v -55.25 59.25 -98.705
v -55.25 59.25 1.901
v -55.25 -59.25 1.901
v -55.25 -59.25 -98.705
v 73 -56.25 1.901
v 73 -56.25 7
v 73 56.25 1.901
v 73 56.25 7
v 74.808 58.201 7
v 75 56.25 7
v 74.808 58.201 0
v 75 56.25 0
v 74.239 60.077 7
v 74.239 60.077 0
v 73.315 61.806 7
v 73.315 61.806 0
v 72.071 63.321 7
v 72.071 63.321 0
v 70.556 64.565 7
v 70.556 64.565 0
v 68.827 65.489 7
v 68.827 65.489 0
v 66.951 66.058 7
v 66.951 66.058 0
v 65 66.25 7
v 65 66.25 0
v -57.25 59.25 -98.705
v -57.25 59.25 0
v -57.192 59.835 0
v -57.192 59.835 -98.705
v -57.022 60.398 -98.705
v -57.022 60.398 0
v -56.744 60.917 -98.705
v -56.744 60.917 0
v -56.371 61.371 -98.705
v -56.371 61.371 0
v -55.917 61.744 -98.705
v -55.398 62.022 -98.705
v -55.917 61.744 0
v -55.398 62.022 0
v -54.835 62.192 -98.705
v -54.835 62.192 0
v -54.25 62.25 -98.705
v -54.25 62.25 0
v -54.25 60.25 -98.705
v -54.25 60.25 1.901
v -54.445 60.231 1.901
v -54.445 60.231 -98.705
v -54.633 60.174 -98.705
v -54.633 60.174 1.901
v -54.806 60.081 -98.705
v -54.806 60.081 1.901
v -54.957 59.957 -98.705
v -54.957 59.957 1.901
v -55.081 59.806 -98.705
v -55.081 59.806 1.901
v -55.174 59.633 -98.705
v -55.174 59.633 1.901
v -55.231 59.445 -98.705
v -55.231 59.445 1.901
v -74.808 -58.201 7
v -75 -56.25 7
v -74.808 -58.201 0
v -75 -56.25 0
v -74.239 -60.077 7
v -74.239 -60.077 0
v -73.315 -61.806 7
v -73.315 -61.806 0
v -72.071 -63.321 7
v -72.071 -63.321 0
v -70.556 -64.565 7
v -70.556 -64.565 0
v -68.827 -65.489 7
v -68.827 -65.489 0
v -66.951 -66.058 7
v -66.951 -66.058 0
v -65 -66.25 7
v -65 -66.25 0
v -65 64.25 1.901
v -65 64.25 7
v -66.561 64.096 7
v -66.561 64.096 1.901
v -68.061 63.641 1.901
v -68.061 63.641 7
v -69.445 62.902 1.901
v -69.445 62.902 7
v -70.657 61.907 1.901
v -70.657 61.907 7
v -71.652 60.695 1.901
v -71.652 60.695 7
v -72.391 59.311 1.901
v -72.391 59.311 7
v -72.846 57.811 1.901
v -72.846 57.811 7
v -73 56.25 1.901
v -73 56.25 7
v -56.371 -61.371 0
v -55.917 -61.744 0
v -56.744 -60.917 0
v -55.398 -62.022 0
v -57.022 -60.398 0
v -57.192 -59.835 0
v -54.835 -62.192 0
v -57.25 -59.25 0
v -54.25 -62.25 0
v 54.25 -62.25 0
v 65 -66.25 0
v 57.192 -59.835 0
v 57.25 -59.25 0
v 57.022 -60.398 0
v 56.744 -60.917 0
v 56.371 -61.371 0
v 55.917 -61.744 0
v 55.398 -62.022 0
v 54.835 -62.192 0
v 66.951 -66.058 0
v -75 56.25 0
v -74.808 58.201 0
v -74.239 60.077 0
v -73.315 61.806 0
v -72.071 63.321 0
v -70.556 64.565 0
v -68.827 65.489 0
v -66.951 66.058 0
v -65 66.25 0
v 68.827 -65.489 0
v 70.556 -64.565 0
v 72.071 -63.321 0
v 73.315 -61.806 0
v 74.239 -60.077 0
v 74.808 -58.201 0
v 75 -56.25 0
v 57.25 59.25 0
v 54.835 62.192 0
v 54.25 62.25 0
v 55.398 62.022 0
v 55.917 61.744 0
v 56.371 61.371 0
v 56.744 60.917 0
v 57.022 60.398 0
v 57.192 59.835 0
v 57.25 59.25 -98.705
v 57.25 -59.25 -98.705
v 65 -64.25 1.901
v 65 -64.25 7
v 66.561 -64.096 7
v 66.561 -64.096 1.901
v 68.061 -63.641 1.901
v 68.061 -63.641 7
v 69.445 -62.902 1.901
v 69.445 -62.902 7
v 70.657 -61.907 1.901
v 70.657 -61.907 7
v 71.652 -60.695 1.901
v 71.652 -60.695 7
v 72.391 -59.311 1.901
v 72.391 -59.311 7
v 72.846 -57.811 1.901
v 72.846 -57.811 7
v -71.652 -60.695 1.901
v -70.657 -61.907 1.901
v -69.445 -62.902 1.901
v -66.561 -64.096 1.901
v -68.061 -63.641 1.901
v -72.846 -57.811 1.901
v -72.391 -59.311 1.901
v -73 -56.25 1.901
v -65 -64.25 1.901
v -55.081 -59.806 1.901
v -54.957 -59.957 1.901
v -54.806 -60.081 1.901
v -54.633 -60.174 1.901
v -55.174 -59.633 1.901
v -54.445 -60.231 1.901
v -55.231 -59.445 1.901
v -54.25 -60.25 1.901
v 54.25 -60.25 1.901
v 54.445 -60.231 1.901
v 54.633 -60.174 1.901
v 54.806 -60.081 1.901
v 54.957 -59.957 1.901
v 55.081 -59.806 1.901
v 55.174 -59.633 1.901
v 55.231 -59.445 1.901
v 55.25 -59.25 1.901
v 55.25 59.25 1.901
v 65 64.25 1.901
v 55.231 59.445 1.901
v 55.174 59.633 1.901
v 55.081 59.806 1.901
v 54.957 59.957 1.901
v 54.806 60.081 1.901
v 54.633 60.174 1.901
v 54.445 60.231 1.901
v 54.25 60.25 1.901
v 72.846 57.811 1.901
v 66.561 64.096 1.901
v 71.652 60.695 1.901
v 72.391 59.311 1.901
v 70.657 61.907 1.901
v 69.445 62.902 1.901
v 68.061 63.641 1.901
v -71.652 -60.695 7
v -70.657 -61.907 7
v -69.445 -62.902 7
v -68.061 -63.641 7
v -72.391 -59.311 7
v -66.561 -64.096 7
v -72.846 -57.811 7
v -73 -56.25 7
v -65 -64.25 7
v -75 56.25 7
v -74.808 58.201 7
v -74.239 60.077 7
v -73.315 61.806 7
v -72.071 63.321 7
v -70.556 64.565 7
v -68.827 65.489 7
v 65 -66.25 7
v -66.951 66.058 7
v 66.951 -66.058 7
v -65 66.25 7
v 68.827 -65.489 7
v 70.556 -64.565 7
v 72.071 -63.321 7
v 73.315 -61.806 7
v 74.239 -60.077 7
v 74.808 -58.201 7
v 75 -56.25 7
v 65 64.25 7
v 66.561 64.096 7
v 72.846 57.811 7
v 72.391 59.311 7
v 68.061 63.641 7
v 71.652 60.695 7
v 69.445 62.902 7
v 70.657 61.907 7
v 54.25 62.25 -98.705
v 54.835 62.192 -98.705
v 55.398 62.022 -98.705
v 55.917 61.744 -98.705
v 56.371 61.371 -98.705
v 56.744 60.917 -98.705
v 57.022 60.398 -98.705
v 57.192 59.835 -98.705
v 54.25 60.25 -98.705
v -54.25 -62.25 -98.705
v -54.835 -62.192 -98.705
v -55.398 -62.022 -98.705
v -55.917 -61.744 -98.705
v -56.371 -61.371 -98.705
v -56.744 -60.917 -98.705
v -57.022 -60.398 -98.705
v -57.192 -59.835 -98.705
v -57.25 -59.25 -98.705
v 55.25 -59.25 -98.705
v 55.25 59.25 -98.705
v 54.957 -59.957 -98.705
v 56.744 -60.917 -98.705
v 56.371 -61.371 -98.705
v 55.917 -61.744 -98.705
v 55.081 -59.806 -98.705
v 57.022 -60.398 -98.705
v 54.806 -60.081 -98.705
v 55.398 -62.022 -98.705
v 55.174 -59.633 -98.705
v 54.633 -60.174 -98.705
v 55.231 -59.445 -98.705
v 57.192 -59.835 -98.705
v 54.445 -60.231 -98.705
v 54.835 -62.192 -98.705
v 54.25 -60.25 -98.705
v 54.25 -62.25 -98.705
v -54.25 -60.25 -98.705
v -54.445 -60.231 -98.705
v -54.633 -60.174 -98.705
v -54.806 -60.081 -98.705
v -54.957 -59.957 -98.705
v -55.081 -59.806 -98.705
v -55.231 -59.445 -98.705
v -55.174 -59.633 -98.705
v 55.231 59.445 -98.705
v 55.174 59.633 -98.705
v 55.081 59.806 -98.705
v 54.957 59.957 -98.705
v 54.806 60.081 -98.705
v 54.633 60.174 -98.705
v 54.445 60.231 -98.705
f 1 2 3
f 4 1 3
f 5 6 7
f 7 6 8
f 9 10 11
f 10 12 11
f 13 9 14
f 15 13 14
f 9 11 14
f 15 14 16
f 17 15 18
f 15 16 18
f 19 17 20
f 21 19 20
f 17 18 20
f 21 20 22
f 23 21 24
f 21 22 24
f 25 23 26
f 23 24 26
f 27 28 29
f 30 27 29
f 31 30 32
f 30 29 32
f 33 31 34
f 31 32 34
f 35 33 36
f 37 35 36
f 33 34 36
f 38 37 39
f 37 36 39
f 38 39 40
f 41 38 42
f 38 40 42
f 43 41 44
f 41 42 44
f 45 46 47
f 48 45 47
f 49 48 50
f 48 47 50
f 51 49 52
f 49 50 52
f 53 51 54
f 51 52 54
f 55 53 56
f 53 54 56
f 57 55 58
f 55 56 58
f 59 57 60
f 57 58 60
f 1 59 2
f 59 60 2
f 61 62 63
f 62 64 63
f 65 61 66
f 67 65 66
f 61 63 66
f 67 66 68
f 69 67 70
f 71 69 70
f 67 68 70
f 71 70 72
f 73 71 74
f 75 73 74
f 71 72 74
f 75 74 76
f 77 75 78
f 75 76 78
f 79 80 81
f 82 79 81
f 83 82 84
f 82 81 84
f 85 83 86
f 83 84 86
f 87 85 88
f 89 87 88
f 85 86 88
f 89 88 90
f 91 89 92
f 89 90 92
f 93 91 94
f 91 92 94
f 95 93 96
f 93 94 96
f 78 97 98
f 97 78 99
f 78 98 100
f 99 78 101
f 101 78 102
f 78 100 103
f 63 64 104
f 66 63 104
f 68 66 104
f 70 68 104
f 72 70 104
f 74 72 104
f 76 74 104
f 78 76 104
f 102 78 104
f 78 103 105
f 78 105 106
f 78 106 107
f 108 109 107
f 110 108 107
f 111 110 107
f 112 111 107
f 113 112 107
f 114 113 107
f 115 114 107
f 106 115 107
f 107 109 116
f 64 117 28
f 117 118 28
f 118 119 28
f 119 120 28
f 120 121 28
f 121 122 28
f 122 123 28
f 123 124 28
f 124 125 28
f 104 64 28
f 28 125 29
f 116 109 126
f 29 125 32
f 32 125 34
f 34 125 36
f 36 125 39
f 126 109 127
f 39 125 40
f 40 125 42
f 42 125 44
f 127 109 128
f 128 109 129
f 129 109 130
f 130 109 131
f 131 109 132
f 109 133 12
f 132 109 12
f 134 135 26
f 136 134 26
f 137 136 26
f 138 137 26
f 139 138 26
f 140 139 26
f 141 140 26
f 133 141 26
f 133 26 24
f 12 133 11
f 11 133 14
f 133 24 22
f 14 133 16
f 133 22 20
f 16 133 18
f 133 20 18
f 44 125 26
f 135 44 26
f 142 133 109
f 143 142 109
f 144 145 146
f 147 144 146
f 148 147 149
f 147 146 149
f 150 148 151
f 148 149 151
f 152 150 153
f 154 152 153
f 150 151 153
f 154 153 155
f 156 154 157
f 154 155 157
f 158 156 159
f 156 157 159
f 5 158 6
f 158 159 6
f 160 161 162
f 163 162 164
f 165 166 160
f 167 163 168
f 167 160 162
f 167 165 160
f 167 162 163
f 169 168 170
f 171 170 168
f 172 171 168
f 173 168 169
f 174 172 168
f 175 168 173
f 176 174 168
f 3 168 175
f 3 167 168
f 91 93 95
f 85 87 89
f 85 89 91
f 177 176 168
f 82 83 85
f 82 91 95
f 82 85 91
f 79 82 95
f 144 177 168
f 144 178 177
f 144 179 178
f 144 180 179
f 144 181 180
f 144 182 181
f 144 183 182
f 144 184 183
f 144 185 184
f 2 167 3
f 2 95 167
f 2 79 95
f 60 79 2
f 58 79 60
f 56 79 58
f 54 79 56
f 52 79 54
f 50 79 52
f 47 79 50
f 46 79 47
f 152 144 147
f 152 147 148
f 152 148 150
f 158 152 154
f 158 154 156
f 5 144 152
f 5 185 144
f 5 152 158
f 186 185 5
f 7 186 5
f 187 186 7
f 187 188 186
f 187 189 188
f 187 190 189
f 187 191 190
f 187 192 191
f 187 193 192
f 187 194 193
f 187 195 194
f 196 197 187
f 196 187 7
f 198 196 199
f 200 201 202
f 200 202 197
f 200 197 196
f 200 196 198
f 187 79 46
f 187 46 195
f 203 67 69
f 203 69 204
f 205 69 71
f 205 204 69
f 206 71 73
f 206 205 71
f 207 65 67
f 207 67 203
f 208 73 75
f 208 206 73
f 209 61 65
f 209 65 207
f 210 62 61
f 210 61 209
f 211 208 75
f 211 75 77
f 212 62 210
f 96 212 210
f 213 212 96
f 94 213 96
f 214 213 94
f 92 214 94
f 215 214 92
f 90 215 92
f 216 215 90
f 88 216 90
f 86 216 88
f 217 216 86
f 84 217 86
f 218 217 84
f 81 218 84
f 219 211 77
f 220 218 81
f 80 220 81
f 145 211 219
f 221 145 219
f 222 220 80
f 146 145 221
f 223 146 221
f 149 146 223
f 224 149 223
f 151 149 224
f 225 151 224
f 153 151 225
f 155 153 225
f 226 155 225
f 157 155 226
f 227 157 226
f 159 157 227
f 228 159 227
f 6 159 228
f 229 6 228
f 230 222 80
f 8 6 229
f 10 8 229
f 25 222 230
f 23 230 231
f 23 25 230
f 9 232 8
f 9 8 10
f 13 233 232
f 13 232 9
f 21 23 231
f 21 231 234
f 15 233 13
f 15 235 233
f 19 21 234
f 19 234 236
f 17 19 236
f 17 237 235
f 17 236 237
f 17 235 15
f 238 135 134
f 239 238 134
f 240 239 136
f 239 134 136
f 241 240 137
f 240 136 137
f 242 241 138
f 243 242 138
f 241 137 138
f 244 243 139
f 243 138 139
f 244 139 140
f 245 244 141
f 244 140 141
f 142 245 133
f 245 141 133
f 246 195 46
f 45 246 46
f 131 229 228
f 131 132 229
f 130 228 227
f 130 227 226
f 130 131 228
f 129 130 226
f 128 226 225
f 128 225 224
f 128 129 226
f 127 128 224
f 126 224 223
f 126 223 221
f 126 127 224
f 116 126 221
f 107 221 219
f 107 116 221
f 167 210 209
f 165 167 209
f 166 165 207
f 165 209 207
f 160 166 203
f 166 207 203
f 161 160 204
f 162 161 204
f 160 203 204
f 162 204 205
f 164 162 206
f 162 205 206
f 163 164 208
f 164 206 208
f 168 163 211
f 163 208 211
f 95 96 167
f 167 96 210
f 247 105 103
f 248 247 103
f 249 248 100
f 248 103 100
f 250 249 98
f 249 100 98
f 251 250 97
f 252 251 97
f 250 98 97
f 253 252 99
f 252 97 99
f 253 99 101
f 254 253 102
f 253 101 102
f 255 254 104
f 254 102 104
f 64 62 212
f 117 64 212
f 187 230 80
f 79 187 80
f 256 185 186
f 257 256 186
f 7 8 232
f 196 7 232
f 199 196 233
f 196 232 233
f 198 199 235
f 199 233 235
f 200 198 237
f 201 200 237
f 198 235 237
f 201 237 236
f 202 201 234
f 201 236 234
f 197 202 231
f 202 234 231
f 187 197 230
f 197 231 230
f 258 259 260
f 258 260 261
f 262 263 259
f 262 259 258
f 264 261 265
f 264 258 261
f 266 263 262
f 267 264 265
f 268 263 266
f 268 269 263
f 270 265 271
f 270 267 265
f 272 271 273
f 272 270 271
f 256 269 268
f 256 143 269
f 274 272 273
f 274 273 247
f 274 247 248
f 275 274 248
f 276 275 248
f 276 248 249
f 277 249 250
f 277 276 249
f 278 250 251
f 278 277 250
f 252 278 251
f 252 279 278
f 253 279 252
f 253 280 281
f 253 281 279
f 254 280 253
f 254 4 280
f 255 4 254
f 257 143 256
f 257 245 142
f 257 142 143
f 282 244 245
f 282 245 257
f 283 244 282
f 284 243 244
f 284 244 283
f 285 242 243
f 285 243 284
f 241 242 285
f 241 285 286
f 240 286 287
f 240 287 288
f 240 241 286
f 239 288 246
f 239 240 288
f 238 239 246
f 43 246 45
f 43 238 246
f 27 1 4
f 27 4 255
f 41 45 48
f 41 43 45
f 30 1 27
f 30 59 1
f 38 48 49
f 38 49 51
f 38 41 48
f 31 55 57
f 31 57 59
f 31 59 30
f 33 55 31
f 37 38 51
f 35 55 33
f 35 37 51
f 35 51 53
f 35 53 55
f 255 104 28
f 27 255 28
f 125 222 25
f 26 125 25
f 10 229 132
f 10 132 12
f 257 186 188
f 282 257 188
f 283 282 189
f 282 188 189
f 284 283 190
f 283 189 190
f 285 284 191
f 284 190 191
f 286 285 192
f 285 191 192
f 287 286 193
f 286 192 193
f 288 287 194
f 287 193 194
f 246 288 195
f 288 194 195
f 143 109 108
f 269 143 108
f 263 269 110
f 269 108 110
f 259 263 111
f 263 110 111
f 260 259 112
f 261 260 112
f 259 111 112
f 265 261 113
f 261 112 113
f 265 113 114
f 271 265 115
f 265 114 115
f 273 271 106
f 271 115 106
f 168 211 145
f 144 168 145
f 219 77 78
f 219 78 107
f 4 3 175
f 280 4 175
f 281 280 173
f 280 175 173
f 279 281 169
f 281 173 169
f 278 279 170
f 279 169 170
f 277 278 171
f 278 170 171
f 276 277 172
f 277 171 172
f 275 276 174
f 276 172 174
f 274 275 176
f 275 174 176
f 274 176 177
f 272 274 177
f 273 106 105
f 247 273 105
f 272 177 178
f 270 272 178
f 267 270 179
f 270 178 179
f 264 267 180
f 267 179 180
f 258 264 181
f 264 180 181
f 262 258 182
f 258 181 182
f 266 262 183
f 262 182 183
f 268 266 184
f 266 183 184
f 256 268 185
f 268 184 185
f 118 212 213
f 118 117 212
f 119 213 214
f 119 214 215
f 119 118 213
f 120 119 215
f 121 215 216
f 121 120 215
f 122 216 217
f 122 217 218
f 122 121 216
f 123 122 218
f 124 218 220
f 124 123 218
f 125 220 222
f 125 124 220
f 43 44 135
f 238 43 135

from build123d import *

# Parameters (mm, degrees)
BOSS_EXTRUDE1_DEPTH = 98.705
BOSS_EXTRUDE2_START = 7
SKETCH5_W           = 150
SKETCH5_H           = 132.5
BOSS_EXTRUDE2_DEPTH = 7
FILLET1_R           = 10
CUT_EXTRUDE1_DEPTH  = 5.099


with BuildPart() as part:
    # Sketch1 → Boss-Extrude1 (new body)
    with BuildSketch(Plane.XY):
        with BuildLine():
            Line((-54.25, 62.25), (54.25, 62.25))
            ThreePointArc((54.25, 62.25), (56.371320344, 61.371320344), (57.25, 59.25))
            Line((57.25, 59.25), (57.25, -59.25))
            ThreePointArc((57.25, -59.25), (56.371320344, -61.371320344), (54.25, -62.25))
            Line((54.25, -62.25), (-54.25, -62.25))
            ThreePointArc((-54.25, -62.25), (-56.371320344, -61.371320344), (-57.25, -59.25))
            Line((-57.25, -59.25), (-57.25, 59.25))
            ThreePointArc((-57.25, 59.25), (-56.371320344, 61.371320344), (-54.25, 62.25))
        make_face()
        with BuildLine():
            Line((-55.25, 59.25), (-55.25, -59.25))
            ThreePointArc((-55.25, -59.25), (-54.957106781, -59.957106781), (-54.25, -60.25))
            Line((-54.25, -60.25), (54.25, -60.25))
            ThreePointArc((54.25, -60.25), (54.957106781, -59.957106781), (55.25, -59.25))
            Line((55.25, -59.25), (55.25, 59.25))
            ThreePointArc((55.25, 59.25), (54.957106781, 59.957106781), (54.25, 60.25))
            Line((54.25, 60.25), (-54.25, 60.25))
            ThreePointArc((-54.25, 60.25), (-54.957106781, 59.957106781), (-55.25, 59.25))
        make_face(mode=Mode.SUBTRACT)
    extrude(amount=-BOSS_EXTRUDE1_DEPTH)

    # Sketch5 → Boss-Extrude2 (add)
    with BuildSketch(Plane.XY.offset(BOSS_EXTRUDE2_START)):
        Rectangle(SKETCH5_W, SKETCH5_H)
        with BuildLine():
            Line((-54.25, -60.25), (54.25, -60.25))
            ThreePointArc((54.25, -60.25), (54.957106781, -59.957106781), (55.25, -59.25))
            Line((55.25, -59.25), (55.25, 59.25))
            ThreePointArc((55.25, 59.25), (54.957106781, 59.957106781), (54.25, 60.25))
            Line((54.25, 60.25), (-54.25, 60.25))
            ThreePointArc((-54.25, 60.25), (-54.957106781, 59.957106781), (-55.25, 59.25))
            Line((-55.25, 59.25), (-55.25, -59.25))
            ThreePointArc((-55.25, -59.25), (-54.957106781, -59.957106781), (-54.25, -60.25))
        make_face(mode=Mode.SUBTRACT)
    extrude(amount=-BOSS_EXTRUDE2_DEPTH)

    # Fillet1
    fillet1_edges = [part.edges().sort_by_distance(p)[0] for p in [
        (-75, 66.25, 3.5),
        (-75, -66.25, 3.5),
        (75, -66.25, 3.5),
        (75, 66.25, 3.5),
    ]]
    fillet(fillet1_edges, radius=FILLET1_R)

    # Sketch6 → Cut-Extrude1 (cut)
    with BuildSketch(Plane.XY.offset(7)):
        with BuildLine():
            Line((73, -56.25), (73, 56.25))
            ThreePointArc((73, 56.25), (70.656854249, 61.906854249), (65, 64.25))
            Line((65, 64.25), (-65, 64.25))
            ThreePointArc((-65, 64.25), (-70.656854249, 61.906854249), (-73, 56.25))
            Line((-73, 56.25), (-73, -56.25))
            ThreePointArc((-73, -56.25), (-70.656854249, -61.906854249), (-65, -64.25))
            Line((-65, -64.25), (65, -64.25))
            ThreePointArc((65, -64.25), (70.656854249, -61.906854249), (73, -56.25))
        make_face()
    extrude(amount=-CUT_EXTRUDE1_DEPTH, mode=Mode.SUBTRACT)


solid = part.part
